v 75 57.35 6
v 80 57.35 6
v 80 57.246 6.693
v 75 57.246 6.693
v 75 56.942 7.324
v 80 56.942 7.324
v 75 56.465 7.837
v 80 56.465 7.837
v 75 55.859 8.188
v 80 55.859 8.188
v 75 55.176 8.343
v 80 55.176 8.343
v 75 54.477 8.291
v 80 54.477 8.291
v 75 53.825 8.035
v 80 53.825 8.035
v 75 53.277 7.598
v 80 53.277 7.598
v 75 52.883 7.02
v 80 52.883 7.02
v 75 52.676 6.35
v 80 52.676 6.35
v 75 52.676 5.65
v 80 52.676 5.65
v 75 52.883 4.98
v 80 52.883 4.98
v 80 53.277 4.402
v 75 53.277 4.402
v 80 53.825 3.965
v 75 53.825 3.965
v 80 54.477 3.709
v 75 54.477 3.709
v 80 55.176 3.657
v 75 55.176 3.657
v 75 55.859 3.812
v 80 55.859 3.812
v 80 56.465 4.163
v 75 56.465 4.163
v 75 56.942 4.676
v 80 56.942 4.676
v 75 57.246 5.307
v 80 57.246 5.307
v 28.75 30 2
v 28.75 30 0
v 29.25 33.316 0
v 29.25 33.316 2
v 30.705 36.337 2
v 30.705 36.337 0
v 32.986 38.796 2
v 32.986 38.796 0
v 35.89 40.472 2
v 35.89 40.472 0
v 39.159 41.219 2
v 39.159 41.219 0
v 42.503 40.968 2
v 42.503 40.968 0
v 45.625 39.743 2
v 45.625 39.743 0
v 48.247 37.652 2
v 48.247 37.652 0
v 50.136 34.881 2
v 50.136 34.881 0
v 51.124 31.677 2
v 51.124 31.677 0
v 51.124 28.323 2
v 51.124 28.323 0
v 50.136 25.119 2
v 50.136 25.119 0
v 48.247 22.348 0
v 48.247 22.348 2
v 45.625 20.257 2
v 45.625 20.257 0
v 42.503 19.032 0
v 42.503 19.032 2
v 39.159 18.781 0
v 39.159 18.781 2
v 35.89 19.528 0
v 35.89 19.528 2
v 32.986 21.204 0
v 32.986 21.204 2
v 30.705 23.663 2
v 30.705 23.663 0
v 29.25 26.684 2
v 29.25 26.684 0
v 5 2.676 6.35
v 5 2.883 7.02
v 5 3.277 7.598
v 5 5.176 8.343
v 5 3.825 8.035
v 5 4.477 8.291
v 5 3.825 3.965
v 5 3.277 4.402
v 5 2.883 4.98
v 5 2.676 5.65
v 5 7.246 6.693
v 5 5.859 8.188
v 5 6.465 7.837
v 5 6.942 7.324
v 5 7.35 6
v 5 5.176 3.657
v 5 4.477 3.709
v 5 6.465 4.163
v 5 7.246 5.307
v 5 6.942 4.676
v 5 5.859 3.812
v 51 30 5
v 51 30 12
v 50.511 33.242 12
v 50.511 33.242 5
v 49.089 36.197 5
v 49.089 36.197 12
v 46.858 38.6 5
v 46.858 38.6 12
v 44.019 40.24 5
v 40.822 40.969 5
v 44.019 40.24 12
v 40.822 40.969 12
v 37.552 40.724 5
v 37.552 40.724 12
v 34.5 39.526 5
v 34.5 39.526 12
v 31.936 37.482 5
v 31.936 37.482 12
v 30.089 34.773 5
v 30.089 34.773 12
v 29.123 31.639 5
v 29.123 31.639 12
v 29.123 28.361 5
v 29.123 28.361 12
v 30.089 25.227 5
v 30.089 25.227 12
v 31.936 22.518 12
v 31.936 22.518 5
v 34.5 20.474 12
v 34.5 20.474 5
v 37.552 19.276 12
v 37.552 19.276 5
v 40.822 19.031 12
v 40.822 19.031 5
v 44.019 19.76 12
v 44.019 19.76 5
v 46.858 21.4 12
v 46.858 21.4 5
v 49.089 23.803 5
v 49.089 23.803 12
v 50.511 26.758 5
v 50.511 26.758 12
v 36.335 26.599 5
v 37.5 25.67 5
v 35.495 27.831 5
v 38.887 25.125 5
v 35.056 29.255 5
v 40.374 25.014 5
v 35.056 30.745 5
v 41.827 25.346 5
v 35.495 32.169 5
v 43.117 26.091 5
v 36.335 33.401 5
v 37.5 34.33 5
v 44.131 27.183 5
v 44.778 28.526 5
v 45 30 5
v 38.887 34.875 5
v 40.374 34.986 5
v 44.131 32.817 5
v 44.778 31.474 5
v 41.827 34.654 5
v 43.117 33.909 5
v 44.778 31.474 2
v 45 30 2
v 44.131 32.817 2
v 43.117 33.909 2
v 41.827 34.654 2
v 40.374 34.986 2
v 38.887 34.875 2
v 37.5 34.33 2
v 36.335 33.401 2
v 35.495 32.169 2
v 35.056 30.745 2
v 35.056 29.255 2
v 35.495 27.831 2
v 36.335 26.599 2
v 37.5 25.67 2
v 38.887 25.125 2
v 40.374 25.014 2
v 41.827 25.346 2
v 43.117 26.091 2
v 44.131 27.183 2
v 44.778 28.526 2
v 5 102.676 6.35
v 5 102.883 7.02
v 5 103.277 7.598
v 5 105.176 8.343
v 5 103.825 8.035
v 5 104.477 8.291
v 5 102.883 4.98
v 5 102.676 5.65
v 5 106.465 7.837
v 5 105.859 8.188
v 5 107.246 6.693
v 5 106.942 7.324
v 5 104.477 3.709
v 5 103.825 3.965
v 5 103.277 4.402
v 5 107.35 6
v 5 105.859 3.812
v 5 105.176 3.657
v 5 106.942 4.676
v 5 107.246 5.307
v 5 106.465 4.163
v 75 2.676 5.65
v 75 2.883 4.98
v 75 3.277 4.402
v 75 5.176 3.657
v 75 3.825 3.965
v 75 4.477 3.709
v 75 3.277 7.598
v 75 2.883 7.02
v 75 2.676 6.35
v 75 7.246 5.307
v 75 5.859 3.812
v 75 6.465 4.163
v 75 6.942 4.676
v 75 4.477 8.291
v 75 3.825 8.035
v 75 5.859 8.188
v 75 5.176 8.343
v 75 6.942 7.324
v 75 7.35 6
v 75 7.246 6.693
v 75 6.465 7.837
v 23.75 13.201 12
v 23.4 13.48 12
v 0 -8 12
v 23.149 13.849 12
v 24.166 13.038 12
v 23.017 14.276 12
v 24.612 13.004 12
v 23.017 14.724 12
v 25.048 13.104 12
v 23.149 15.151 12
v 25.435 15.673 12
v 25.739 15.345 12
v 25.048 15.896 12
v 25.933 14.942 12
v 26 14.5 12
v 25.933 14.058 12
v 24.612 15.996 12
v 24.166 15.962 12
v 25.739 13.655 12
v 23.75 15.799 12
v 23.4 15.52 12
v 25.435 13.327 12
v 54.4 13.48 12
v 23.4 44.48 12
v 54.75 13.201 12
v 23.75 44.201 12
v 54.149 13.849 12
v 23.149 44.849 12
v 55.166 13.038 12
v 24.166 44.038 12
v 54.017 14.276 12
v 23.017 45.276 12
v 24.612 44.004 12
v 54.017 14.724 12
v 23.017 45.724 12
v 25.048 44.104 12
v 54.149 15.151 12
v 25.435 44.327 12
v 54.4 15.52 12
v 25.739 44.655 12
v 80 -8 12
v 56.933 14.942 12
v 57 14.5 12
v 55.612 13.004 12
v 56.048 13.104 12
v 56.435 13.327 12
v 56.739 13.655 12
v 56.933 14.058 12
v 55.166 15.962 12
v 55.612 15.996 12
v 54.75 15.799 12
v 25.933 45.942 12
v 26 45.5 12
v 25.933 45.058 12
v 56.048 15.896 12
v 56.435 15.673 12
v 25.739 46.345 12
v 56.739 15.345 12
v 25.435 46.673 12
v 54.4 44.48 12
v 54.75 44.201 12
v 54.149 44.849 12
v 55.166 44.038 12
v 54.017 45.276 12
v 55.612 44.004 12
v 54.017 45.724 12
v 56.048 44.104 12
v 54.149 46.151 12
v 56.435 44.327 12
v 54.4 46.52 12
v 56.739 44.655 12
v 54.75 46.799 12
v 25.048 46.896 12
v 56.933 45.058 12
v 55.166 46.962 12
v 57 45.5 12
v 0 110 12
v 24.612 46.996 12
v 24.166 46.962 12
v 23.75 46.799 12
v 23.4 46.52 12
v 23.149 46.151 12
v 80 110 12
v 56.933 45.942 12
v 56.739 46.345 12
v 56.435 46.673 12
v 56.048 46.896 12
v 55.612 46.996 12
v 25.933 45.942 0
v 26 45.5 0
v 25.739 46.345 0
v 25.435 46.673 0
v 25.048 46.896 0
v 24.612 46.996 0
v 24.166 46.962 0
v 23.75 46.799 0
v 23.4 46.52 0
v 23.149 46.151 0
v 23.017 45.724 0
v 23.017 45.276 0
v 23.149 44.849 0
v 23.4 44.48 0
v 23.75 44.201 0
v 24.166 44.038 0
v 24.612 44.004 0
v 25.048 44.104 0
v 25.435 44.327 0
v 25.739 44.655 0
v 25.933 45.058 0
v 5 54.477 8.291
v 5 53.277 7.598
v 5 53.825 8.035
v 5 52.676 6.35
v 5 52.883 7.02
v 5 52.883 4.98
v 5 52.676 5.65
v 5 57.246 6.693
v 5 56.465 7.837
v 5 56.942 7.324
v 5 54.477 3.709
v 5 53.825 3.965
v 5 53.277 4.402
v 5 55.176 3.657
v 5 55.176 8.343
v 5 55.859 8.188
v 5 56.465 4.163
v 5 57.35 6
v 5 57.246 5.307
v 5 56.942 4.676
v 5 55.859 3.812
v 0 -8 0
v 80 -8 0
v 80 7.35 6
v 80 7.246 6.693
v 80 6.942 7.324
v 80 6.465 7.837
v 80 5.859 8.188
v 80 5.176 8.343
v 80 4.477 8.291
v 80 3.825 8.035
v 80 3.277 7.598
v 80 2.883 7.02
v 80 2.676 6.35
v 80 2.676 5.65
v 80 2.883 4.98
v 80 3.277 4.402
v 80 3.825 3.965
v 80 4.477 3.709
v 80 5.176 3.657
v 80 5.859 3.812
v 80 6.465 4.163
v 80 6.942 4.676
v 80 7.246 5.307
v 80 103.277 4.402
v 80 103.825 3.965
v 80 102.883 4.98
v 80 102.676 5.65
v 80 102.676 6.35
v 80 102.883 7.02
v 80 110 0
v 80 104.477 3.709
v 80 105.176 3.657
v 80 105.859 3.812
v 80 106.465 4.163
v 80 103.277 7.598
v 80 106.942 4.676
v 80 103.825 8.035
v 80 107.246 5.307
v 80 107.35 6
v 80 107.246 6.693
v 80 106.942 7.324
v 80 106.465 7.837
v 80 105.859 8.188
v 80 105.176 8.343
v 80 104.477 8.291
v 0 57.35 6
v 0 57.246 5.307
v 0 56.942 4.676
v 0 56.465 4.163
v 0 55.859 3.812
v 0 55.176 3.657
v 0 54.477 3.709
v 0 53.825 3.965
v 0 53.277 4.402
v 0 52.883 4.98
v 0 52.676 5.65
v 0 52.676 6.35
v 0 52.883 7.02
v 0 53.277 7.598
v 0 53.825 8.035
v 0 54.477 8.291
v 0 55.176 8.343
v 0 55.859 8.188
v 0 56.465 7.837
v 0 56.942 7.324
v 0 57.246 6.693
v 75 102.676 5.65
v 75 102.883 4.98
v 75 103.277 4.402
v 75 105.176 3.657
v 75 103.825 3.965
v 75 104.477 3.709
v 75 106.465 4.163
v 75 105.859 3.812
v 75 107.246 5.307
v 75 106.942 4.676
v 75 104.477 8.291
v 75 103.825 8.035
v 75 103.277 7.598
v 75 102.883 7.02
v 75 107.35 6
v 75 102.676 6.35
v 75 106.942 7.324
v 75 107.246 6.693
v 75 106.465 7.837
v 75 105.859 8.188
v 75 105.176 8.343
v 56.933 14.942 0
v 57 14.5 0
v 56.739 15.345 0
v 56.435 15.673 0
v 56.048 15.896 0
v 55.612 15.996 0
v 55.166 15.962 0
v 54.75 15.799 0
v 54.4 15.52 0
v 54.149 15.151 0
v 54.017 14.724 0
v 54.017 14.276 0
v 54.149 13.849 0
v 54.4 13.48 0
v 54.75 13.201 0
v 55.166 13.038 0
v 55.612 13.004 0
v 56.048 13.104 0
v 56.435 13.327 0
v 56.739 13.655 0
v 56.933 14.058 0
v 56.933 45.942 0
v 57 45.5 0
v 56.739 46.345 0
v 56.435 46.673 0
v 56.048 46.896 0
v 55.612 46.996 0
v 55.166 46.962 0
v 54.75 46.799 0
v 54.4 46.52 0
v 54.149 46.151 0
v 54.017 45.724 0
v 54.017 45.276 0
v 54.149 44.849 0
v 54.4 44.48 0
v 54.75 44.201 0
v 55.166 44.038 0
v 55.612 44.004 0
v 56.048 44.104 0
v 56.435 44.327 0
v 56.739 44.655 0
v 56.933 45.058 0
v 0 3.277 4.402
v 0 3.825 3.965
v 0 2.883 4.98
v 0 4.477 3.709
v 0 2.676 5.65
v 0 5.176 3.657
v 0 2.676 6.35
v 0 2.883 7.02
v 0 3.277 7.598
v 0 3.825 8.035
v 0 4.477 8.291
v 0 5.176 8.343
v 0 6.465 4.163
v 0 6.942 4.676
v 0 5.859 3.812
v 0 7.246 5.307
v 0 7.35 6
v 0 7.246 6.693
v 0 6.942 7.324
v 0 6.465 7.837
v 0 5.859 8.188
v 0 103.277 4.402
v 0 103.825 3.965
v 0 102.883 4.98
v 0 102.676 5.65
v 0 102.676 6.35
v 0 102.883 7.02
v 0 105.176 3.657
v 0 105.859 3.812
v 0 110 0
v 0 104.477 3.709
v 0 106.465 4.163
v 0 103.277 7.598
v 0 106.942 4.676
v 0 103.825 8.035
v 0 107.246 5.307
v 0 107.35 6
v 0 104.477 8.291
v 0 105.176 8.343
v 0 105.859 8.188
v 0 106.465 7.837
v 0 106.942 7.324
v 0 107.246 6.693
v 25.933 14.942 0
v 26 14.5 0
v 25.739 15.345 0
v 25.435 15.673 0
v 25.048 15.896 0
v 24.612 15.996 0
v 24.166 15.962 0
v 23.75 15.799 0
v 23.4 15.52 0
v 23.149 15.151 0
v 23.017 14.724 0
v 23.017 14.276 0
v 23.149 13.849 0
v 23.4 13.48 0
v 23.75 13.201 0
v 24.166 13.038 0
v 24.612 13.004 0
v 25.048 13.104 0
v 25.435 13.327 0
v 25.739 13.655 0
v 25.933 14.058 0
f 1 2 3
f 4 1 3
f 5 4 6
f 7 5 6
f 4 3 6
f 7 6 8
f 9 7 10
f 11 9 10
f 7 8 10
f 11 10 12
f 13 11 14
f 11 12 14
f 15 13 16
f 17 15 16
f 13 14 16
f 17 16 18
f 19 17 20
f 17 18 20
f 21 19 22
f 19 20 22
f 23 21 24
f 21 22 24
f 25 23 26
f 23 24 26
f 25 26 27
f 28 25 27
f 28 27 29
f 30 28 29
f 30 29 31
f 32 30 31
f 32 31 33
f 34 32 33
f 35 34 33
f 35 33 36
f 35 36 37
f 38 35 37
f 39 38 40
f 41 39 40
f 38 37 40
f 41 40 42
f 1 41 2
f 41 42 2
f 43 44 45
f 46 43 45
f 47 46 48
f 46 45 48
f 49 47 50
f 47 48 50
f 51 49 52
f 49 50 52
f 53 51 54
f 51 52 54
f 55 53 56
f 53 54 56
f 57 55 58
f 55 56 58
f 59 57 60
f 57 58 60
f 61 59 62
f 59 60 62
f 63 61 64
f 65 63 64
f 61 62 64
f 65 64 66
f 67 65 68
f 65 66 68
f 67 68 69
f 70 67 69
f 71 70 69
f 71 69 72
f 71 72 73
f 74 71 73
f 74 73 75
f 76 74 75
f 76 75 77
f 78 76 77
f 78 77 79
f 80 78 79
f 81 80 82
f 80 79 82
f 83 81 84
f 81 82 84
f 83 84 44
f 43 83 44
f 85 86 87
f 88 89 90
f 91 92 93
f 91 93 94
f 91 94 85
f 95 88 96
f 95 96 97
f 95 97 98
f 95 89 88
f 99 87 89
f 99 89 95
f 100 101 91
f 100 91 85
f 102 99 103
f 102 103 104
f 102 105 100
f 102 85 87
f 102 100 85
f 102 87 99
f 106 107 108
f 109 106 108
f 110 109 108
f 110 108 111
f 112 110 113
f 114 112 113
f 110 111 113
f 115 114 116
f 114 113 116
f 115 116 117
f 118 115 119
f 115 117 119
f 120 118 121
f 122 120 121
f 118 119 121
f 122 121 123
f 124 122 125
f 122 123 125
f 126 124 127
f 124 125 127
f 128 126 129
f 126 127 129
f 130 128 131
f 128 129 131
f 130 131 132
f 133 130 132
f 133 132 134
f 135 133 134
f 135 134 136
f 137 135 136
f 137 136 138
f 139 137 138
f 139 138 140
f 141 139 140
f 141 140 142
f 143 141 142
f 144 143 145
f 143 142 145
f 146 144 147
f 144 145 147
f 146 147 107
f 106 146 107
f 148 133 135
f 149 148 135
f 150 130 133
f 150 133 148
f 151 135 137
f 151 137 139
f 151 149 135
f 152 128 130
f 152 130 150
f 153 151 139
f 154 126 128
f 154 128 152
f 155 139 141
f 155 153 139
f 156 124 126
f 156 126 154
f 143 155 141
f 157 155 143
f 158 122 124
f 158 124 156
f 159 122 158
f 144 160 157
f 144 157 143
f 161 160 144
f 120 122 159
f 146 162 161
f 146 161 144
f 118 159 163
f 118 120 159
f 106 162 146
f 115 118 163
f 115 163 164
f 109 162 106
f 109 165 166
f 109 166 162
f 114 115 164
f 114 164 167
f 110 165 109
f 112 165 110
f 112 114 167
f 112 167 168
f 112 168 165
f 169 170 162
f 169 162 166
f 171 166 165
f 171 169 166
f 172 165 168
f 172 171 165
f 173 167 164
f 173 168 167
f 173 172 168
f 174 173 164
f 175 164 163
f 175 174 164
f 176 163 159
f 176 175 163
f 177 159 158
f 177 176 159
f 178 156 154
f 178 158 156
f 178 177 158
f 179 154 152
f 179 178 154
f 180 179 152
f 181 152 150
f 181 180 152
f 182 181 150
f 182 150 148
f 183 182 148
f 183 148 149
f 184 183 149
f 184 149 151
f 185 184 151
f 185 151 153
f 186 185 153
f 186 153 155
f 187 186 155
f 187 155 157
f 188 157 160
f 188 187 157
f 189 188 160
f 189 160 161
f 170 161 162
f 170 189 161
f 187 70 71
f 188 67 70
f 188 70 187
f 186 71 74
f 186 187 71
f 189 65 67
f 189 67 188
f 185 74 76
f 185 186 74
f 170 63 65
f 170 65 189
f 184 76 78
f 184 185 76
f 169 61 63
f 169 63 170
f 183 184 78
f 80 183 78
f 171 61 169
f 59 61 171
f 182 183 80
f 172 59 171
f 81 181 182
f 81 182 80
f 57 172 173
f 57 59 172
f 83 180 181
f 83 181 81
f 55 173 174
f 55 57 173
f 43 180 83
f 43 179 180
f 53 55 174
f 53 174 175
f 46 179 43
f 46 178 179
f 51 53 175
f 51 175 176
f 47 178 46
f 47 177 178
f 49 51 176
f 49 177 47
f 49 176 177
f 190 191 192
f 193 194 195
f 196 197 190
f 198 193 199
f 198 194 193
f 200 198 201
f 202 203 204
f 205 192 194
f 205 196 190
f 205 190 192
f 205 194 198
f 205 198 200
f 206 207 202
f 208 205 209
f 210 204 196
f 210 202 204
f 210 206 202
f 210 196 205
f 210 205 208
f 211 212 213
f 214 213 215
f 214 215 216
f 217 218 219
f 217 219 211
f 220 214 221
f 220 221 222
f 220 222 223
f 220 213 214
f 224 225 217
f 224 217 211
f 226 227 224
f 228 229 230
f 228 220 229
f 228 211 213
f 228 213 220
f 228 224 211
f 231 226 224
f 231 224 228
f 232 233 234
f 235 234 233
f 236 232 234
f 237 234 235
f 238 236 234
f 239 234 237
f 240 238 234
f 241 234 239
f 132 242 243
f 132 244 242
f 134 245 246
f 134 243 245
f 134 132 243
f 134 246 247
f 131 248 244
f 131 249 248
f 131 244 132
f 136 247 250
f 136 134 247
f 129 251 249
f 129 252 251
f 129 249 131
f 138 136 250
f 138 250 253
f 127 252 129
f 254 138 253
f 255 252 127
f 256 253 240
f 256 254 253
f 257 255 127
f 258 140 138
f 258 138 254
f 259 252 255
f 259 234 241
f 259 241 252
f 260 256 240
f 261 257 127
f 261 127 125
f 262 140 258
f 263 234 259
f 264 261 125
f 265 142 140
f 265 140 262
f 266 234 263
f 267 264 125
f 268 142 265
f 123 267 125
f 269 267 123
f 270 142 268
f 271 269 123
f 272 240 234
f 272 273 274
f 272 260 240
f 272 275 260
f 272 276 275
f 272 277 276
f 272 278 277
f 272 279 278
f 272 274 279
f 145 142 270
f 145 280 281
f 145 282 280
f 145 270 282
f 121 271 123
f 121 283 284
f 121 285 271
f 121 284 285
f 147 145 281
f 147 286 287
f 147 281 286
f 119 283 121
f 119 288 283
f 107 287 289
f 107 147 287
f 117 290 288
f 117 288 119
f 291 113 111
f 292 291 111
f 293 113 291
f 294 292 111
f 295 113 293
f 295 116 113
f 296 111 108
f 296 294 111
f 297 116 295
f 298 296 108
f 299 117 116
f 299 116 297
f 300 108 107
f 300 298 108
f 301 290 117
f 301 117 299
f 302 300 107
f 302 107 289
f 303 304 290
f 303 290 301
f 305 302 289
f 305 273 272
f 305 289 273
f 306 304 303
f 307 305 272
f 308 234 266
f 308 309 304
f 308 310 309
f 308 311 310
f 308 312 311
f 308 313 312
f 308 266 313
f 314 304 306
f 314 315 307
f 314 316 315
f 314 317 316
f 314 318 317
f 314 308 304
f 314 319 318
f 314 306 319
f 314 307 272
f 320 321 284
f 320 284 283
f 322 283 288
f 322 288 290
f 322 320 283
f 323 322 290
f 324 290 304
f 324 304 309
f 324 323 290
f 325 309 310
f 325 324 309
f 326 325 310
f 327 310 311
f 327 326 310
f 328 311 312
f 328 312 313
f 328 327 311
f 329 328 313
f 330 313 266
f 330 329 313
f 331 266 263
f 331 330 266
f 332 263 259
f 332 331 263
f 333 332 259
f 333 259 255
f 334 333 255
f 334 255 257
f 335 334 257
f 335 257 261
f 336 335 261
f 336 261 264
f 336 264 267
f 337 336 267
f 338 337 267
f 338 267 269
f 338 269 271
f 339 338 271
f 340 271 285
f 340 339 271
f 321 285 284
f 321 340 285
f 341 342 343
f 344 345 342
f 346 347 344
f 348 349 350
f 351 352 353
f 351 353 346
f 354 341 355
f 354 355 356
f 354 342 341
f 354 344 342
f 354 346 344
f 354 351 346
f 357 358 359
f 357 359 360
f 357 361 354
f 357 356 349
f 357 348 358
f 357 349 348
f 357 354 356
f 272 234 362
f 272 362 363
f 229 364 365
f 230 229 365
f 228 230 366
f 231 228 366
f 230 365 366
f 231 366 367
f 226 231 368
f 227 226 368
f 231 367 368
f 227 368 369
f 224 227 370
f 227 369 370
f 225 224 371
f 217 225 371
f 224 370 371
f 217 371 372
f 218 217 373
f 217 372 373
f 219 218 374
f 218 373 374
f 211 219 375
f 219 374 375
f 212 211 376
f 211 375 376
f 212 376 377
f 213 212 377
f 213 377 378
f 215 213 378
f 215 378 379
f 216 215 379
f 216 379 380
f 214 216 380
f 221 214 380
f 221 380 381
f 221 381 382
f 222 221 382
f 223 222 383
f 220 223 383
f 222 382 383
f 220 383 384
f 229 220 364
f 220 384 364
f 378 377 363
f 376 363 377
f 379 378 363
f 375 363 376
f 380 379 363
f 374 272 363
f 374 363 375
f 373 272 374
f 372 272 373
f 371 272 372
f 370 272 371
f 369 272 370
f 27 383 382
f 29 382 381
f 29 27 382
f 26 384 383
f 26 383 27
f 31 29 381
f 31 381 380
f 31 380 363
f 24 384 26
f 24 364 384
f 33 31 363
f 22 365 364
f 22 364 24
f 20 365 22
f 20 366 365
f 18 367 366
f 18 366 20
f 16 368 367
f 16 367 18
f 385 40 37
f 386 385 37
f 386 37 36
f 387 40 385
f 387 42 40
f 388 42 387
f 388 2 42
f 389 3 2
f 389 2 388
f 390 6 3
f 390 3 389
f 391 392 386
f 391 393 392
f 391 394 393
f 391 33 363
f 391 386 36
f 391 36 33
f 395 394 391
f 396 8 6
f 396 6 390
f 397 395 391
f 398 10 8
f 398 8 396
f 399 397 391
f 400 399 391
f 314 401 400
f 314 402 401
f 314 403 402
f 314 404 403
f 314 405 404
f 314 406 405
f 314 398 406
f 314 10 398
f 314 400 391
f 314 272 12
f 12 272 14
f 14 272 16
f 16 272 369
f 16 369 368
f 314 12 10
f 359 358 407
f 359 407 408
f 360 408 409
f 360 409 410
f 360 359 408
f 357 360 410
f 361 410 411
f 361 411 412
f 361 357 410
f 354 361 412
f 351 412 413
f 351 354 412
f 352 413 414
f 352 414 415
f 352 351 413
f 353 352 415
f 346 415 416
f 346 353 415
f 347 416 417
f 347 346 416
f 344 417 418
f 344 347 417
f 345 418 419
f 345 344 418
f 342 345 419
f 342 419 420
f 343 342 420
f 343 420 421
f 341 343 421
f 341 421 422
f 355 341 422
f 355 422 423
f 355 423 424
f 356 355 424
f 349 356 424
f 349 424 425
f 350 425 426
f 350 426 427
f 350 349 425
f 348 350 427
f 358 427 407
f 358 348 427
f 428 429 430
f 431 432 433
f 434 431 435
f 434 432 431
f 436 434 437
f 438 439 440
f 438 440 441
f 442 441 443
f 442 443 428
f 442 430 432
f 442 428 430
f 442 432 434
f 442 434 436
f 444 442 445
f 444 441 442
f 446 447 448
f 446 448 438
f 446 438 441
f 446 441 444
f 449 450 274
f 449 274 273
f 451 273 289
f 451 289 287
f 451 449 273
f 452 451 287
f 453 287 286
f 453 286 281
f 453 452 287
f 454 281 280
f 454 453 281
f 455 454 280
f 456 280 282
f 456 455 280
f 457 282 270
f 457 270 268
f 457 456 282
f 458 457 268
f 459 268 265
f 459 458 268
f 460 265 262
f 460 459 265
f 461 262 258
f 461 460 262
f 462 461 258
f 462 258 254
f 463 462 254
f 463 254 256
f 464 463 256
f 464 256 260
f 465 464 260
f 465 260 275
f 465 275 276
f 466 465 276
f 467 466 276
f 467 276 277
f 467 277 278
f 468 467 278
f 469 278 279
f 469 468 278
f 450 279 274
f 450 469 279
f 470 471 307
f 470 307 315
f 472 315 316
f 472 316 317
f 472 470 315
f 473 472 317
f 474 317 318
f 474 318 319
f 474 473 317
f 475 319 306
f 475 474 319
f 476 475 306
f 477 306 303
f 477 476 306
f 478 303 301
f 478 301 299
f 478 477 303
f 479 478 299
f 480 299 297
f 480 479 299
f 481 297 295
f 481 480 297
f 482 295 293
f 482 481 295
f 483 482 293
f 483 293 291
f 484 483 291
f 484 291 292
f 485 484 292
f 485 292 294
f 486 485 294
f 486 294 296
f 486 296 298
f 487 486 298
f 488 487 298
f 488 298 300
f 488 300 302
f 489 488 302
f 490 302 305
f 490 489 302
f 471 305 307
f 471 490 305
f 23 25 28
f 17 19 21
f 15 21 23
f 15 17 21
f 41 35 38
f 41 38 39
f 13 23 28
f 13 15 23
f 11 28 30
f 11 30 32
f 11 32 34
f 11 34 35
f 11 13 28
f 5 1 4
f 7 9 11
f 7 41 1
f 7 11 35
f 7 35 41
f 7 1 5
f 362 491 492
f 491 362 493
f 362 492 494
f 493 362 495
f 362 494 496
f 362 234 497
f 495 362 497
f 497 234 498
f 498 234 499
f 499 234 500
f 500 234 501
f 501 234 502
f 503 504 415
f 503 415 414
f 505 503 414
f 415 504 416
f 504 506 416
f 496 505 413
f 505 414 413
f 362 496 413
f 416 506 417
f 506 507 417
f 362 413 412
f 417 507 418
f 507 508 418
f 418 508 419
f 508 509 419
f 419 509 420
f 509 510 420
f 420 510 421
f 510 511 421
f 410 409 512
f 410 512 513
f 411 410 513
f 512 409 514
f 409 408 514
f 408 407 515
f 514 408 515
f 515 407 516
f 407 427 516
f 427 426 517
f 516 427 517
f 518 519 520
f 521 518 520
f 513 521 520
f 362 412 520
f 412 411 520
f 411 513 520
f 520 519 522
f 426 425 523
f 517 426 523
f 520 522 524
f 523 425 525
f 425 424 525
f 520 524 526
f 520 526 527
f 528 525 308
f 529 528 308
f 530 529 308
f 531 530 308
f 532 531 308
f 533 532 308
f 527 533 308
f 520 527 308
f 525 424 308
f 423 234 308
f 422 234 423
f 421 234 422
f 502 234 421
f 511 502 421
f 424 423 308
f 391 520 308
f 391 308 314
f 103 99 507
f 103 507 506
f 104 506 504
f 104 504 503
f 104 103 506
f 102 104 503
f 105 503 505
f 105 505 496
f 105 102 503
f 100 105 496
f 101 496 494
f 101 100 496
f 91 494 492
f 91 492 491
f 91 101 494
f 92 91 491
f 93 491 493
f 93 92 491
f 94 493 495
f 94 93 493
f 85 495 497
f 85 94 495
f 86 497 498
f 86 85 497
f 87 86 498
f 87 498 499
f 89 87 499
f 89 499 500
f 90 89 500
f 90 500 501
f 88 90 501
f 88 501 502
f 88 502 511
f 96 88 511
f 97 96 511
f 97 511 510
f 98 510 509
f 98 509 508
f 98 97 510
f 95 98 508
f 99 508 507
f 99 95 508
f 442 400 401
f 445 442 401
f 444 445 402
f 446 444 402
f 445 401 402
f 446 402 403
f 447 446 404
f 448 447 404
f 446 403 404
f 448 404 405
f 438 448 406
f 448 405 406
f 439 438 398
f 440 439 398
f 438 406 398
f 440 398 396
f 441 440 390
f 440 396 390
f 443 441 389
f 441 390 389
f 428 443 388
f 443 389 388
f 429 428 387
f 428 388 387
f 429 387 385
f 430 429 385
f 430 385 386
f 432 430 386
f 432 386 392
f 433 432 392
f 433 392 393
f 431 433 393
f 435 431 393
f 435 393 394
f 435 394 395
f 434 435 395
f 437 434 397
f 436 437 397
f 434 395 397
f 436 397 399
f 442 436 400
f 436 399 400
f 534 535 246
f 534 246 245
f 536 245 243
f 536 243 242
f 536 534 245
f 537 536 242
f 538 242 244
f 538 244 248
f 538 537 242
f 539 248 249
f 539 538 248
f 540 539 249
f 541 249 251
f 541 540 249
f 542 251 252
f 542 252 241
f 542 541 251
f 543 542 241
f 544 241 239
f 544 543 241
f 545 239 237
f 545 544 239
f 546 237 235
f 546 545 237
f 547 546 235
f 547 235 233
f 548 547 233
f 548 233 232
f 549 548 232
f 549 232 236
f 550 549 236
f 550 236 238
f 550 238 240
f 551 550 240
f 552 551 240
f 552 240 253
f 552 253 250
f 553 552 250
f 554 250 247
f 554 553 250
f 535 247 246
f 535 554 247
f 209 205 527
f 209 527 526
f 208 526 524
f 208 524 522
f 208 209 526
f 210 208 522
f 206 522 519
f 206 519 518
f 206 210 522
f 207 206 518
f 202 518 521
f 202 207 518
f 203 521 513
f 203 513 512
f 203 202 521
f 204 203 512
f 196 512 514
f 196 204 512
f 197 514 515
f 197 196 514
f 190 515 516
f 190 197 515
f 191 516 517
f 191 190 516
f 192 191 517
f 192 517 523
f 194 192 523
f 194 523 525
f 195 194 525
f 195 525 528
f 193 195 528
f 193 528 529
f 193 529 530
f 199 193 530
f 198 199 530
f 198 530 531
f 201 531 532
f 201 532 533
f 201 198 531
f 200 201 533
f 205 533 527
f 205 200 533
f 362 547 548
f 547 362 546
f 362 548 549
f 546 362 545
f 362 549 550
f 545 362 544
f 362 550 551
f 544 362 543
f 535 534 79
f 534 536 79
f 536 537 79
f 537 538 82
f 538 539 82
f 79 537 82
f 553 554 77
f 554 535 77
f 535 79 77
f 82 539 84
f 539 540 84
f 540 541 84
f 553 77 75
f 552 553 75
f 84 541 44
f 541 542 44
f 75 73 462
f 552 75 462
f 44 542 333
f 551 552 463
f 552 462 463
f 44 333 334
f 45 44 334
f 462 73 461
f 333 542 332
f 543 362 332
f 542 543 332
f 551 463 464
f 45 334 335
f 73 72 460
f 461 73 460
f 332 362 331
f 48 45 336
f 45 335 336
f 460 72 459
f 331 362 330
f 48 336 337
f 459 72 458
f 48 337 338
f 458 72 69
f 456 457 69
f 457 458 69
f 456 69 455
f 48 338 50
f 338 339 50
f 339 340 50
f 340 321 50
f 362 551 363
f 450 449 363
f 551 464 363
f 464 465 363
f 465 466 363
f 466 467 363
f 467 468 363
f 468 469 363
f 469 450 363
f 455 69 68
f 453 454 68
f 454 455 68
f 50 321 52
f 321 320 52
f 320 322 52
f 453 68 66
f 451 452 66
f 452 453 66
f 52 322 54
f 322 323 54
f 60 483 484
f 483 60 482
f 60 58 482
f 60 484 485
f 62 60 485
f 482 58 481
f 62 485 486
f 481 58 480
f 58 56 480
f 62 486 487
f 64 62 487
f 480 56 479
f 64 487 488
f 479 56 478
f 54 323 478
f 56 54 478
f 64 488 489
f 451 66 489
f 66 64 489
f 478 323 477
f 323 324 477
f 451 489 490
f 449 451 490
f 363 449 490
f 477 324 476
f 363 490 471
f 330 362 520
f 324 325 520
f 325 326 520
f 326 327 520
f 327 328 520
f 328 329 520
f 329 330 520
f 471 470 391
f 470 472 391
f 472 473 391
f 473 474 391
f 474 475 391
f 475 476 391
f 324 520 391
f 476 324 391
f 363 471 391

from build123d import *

# Parameters (mm, degrees)
CROQUIS1_W              = 80
CROQUIS1_H              = 110
CROQUIS1_R              = 5
CROQUIS1_R_2            = 1.5
SALIENTE_EXTRUIR1_DEPTH = 12
CROQUIS4_R              = 11.25
CORTAR_EXTRUIR2_DEPTH   = 2
CROQUIS5_R              = 2.35
CORTAR_EXTRUIR3_DEPTH   = 5
CORTAR_EXTRUIR4_START   = -5
CROQUIS6_R              = 2.35
CORTAR_EXTRUIR4_DEPTH   = 5
CROQUIS7_R              = 11
CORTAR_EXTRUIR5_DEPTH   = 7
CROQUIS8_W              = 80
CROQUIS8_H              = 8
SALIENTE_EXTRUIR2_DEPTH = 12


with BuildPart() as part:
    # Croquis1 → Saliente-Extruir1 (new body)
    with BuildSketch(Plane.XY):
        with Locations((40, 55)):
            Rectangle(CROQUIS1_W, CROQUIS1_H)
        with Locations((40, 30)):
            Circle(CROQUIS1_R, mode=Mode.SUBTRACT)
        with Locations((55.5, 45.5)):
            Circle(CROQUIS1_R_2, mode=Mode.SUBTRACT)
        with Locations((24.5, 45.5)):
            Circle(CROQUIS1_R_2, mode=Mode.SUBTRACT)
        with Locations((24.5, 14.5)):
            Circle(CROQUIS1_R_2, mode=Mode.SUBTRACT)
        with Locations((55.5, 14.5)):
            Circle(CROQUIS1_R_2, mode=Mode.SUBTRACT)
    extrude(amount=SALIENTE_EXTRUIR1_DEPTH)

    # Croquis4 → Cortar-Extruir2 (cut)
    with BuildSketch(Plane(origin=(0, 0, 0), x_dir=(-1, 0, 0), z_dir=(0, 0, -1))):
        with Locations((-40, 30)):
            Circle(CROQUIS4_R)
    extrude(amount=-CORTAR_EXTRUIR2_DEPTH, mode=Mode.SUBTRACT)

    # Croquis5 → Cortar-Extruir3 (cut)
    with BuildSketch(Plane(origin=(80, 0, 0), x_dir=(0, 0, -1), z_dir=(1, 0, 0))):
        with Locations(Location((-6, 105, 0), (0, 0, 90))):
            Circle(CROQUIS5_R)
        with Locations(Location((-6, 55, 0), (0, 0, 90))):
            Circle(CROQUIS5_R)
        with Locations(Location((-6, 5, 0), (0, 0, 90))):
            Circle(CROQUIS5_R)
    extrude(amount=-CORTAR_EXTRUIR3_DEPTH, mode=Mode.SUBTRACT)

    # Croquis6 → Cortar-Extruir4 (cut)
    with BuildSketch(Plane.ZY.offset(CORTAR_EXTRUIR4_START)):
        with Locations(Location((6, 105, 0), (0, 0, 90))):
            Circle(CROQUIS6_R)
        with Locations(Location((6, 55, 0), (0, 0, 90))):
            Circle(CROQUIS6_R)
        with Locations(Location((6, 5, 0), (0, 0, 90))):
            Circle(CROQUIS6_R)
    extrude(amount=CORTAR_EXTRUIR4_DEPTH, mode=Mode.SUBTRACT)

    # Croquis7 → Cortar-Extruir5 (cut)
    with BuildSketch(Plane.XY.offset(12)):
        with Locations((40, 30)):
            Circle(CROQUIS7_R)
    extrude(amount=-CORTAR_EXTRUIR5_DEPTH, mode=Mode.SUBTRACT)

    # Croquis8 → Saliente-Extruir2 (add)
    with BuildSketch(Plane.XY.offset(12)):
        with Locations((40, -4)):
            Rectangle(CROQUIS8_W, CROQUIS8_H)
    extrude(amount=-SALIENTE_EXTRUIR2_DEPTH)


solid = part.part
